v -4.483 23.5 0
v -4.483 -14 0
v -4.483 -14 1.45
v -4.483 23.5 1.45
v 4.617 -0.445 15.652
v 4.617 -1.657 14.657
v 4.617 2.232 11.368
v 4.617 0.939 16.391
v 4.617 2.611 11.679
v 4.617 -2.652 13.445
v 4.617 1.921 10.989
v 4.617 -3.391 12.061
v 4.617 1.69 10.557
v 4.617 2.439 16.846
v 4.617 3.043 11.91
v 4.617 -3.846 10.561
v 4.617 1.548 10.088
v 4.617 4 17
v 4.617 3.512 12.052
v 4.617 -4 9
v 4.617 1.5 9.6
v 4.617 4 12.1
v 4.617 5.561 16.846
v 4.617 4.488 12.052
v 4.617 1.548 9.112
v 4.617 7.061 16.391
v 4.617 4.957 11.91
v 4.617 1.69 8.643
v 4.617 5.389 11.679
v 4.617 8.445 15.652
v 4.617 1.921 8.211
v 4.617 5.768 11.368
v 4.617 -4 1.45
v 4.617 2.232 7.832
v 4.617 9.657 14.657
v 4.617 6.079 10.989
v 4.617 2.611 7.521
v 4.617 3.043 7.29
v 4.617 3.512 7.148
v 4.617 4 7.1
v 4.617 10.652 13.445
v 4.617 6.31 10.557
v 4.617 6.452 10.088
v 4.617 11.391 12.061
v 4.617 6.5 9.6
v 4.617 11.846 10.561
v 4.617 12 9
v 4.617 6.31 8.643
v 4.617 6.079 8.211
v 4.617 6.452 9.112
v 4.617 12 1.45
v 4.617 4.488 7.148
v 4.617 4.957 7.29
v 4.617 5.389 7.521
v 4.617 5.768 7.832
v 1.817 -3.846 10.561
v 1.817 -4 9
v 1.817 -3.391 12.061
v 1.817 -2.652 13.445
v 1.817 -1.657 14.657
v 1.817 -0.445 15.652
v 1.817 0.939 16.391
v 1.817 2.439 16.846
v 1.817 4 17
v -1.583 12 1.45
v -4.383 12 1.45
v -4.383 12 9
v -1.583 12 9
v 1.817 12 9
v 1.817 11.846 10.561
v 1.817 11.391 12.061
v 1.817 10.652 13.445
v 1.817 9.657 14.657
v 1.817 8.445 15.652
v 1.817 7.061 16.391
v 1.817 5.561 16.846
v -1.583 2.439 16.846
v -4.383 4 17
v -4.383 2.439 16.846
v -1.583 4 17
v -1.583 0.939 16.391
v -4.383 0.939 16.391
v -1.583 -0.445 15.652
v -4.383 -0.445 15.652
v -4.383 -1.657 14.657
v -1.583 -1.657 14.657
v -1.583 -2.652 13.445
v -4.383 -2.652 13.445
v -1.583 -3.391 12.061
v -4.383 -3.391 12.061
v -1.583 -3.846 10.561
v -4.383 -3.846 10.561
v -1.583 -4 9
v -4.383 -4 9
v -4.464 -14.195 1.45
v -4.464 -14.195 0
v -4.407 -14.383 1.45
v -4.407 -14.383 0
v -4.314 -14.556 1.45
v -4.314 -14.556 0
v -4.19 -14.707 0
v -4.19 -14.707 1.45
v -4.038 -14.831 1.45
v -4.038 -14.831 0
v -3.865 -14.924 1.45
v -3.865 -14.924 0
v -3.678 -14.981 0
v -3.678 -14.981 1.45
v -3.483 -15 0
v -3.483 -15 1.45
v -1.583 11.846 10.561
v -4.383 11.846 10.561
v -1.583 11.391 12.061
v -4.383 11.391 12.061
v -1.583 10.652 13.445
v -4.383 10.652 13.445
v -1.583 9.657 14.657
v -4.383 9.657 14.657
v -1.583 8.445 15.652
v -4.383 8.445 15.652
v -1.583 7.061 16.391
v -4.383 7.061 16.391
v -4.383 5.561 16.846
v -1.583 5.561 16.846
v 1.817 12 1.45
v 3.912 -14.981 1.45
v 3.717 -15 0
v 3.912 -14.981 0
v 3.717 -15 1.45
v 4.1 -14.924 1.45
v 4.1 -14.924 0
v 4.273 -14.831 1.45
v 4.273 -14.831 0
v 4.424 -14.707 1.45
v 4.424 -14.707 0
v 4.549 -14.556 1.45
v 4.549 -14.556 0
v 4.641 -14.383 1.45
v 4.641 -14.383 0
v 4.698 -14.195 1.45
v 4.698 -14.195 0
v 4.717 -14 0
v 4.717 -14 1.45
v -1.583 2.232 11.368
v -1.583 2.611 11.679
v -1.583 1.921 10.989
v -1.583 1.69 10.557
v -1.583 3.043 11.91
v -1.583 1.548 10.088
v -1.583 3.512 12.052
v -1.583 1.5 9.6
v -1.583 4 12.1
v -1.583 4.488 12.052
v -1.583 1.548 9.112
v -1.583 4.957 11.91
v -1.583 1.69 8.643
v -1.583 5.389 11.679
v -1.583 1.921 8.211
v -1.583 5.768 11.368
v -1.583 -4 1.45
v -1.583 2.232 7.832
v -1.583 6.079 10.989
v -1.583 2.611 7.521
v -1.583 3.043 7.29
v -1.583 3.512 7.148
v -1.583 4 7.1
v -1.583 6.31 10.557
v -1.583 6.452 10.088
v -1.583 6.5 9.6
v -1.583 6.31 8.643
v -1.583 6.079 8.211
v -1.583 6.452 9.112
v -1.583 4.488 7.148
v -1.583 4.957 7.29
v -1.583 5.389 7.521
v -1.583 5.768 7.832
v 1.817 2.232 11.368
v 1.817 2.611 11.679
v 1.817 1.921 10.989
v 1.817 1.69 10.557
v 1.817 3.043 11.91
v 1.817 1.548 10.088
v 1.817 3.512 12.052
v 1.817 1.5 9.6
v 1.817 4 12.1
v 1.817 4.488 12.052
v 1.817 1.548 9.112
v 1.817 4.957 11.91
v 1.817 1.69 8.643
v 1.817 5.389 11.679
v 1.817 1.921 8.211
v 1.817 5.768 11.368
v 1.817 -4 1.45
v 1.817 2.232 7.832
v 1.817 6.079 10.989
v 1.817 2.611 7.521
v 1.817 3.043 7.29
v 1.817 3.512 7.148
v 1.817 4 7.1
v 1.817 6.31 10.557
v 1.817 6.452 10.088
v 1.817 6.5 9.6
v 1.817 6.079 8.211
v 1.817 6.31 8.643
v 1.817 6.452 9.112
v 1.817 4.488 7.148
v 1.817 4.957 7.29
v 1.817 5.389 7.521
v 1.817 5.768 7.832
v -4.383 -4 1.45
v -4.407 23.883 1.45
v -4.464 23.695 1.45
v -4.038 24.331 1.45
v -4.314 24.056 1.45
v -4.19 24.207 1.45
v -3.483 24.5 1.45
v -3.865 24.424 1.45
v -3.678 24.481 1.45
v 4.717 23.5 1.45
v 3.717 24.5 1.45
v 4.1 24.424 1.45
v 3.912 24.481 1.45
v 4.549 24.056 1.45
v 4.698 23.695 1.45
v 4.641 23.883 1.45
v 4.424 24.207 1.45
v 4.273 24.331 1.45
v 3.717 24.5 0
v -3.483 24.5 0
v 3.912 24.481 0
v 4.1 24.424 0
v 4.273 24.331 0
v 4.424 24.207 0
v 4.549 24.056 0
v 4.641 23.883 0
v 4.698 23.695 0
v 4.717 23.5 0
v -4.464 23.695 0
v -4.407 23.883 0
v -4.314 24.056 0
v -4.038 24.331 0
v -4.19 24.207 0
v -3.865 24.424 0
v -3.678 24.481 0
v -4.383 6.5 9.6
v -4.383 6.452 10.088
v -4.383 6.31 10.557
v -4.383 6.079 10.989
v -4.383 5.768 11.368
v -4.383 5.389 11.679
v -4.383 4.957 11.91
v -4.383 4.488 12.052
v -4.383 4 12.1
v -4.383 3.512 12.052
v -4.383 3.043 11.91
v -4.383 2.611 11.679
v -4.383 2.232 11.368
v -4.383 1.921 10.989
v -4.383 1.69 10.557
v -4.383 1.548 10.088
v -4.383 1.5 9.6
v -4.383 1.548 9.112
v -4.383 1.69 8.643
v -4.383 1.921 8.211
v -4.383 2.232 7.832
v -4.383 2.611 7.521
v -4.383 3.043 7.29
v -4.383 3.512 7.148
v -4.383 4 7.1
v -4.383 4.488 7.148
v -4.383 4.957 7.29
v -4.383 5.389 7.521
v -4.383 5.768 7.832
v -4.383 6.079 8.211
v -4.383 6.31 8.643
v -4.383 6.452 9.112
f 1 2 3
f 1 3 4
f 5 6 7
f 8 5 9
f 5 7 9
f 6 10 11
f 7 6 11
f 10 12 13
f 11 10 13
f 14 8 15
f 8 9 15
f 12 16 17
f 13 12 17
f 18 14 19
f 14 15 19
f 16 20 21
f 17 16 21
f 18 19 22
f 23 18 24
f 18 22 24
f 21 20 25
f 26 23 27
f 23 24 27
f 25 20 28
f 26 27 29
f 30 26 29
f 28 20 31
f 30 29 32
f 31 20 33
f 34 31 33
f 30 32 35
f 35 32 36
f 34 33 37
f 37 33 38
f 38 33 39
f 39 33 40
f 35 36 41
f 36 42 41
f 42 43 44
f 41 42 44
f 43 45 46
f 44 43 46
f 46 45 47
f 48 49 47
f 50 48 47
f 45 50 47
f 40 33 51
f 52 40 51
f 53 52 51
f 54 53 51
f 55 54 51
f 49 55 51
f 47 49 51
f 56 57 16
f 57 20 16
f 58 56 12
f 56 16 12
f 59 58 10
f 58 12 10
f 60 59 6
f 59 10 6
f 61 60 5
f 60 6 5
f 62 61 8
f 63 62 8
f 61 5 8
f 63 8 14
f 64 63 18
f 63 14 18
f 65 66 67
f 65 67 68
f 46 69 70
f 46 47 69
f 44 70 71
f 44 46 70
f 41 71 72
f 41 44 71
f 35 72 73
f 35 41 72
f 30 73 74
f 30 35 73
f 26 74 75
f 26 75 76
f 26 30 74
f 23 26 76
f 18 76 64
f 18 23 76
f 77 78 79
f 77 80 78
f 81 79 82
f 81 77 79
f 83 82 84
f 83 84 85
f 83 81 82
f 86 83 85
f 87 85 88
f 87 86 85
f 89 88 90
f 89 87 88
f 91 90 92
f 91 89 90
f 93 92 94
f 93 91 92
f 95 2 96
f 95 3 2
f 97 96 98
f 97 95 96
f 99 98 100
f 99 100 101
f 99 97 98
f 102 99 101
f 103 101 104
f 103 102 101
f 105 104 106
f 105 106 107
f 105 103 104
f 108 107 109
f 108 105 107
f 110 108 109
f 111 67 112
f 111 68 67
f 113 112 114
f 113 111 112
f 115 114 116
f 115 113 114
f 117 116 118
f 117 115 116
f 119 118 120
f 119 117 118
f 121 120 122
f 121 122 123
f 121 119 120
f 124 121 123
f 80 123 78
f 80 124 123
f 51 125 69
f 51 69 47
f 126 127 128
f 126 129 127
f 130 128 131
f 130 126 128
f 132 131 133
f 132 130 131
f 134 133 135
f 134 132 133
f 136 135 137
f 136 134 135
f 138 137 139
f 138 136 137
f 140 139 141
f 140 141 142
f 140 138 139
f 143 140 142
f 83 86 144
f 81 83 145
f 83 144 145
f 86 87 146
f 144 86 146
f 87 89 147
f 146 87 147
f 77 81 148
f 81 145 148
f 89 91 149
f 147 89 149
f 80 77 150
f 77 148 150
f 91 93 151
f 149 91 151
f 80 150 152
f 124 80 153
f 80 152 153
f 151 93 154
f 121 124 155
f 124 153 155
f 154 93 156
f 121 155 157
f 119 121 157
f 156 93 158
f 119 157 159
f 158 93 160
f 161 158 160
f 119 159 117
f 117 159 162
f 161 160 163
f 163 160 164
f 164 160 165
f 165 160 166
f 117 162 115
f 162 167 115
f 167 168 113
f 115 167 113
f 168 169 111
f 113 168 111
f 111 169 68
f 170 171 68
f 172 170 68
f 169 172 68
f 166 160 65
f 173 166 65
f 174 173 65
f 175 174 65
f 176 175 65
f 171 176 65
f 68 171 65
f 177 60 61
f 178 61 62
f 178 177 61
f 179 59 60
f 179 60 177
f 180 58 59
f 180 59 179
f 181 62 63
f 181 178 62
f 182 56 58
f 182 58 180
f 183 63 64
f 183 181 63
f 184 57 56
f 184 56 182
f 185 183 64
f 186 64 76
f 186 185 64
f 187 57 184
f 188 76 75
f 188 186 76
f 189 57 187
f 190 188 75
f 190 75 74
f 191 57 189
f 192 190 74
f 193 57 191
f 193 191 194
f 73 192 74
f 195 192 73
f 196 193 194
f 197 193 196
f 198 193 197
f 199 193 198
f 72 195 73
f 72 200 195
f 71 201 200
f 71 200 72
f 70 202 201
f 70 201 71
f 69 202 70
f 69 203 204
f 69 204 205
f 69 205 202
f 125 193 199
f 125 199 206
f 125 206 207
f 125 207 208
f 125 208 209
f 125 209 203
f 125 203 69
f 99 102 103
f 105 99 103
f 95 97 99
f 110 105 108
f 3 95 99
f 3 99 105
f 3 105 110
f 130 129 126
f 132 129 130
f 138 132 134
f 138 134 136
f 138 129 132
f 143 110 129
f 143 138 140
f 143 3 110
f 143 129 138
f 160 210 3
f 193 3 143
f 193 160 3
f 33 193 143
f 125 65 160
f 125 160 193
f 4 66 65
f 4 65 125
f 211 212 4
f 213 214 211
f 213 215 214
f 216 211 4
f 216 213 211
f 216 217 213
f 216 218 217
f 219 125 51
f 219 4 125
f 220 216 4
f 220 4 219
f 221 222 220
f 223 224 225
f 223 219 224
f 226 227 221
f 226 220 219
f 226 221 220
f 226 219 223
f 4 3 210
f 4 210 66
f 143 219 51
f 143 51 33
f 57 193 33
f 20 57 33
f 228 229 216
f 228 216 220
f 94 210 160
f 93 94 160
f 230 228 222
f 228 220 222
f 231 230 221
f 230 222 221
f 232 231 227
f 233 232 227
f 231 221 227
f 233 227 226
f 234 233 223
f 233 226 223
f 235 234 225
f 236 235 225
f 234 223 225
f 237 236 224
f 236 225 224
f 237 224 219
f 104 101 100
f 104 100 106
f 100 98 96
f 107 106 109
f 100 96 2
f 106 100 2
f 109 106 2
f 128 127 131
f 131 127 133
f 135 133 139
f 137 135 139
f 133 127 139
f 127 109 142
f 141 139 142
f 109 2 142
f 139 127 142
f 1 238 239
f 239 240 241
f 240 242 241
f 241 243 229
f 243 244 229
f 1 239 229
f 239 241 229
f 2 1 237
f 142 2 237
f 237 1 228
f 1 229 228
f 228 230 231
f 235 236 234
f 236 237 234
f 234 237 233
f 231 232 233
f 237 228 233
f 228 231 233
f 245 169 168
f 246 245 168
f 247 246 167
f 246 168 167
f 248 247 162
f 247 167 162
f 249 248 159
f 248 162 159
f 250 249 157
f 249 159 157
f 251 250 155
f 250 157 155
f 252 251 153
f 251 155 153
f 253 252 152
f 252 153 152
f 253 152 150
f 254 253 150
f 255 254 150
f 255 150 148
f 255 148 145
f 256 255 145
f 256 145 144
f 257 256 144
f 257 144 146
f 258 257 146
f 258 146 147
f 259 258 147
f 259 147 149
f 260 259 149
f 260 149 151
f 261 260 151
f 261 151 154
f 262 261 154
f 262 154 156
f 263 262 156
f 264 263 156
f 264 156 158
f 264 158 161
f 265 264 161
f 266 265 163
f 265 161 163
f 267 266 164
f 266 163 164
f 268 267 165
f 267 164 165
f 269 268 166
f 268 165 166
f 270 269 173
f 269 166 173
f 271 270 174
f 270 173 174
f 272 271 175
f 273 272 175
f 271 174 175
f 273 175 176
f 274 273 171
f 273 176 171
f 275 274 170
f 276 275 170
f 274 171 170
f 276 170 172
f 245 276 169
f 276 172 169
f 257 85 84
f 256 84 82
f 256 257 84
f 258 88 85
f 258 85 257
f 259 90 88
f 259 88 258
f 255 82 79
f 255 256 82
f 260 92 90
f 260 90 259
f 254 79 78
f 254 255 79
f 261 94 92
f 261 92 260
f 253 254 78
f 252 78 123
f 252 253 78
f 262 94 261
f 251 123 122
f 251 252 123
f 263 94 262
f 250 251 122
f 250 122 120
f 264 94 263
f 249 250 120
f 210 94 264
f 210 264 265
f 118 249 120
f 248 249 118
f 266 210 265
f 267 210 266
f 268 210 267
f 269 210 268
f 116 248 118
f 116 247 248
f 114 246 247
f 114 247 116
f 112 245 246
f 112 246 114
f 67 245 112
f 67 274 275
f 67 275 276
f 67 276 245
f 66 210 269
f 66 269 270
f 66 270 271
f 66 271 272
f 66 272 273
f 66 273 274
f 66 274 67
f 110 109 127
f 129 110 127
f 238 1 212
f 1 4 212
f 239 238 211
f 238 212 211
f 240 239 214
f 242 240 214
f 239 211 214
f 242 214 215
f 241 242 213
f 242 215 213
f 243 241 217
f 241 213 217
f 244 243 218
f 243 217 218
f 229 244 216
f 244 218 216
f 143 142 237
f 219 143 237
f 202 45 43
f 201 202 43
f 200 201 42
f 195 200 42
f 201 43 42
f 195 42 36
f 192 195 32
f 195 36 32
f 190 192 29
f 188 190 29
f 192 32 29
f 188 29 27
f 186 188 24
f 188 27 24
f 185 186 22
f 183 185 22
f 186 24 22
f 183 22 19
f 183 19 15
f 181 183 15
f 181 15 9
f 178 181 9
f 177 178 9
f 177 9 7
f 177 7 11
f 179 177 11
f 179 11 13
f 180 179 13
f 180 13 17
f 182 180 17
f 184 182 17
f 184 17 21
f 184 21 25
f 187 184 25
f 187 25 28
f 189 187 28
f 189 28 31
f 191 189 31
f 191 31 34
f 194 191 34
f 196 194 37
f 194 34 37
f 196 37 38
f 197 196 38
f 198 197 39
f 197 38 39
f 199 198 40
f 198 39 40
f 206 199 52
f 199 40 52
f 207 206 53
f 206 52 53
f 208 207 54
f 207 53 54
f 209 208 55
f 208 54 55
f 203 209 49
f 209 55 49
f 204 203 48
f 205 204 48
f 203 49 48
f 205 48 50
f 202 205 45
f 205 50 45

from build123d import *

# Parameters (mm, degrees)
F0_W     = 9.2
F0_H     = 39.5
F0_W_2   = 2.8
F0_H_2   = 16
F1_DEPTH = 1.45
F2_DEPTH = 17
F3_R     = 7.99999
F4_R     = 2.5
F5_DEPTH = 25
F6_R     = 1


# Not quite as in the source:
# - a fillet or chamfer is up to 0.001 mm smaller than in the source, because OpenCascade refuses the exact size


with BuildPart() as f1:
    # F0 (on Top) → F1 (new body)
    with BuildSketch(Plane.XY):
        with Locations((0.1172406439, 4.75)):
            Rectangle(F0_W, F0_H)
        with Locations((-2.9827593561, 4)):
            Rectangle(F0_W_2, F0_H_2, mode=Mode.SUBTRACT)
        with Locations((3.2172406439, 4)):
            Rectangle(F0_W_2, F0_H_2, mode=Mode.SUBTRACT)
    extrude(amount=F1_DEPTH)

    # F0 (on Top) → F2 (join)
    with BuildSketch(Plane.XY):
        with Locations((-2.9827593561, 4)):
            Rectangle(F0_W_2, F0_H_2)
        with Locations((3.2172406439, 4)):
            Rectangle(F0_W_2, F0_H_2)
    extrude(amount=F2_DEPTH)

    # F3 (radius 8 in the source; OpenCascade refuses exactly that, so slightly less here)
    f3_edges = [f1.edges().sort_by_distance(p)[0] for p in [
        (-2.982759, 12, 17),
        (3.217241, 12, 17),
        (3.217241, -4, 17),
        (-2.982759, -4, 17),
    ]]
    fillet(f3_edges, radius=F3_R)

    # F4 (on face) → F5 (cut)
    with BuildSketch(Plane.YZ.offset(4.6172406439)):
        with Locations((4, 9.6)):
            Circle(F4_R)
    extrude(amount=-F5_DEPTH, mode=Mode.SUBTRACT)

    # F6
    f6_edges = [f1.edges().sort_by_distance(p)[0] for p in [
        (4.717241, 24.5, 0.725),
        (-4.482759, 24.5, 0.725),
        (4.717241, -15, 0.725),
        (-4.482759, -15, 0.725),
    ]]
    fillet(f6_edges, radius=F6_R)


solid = f1.part
